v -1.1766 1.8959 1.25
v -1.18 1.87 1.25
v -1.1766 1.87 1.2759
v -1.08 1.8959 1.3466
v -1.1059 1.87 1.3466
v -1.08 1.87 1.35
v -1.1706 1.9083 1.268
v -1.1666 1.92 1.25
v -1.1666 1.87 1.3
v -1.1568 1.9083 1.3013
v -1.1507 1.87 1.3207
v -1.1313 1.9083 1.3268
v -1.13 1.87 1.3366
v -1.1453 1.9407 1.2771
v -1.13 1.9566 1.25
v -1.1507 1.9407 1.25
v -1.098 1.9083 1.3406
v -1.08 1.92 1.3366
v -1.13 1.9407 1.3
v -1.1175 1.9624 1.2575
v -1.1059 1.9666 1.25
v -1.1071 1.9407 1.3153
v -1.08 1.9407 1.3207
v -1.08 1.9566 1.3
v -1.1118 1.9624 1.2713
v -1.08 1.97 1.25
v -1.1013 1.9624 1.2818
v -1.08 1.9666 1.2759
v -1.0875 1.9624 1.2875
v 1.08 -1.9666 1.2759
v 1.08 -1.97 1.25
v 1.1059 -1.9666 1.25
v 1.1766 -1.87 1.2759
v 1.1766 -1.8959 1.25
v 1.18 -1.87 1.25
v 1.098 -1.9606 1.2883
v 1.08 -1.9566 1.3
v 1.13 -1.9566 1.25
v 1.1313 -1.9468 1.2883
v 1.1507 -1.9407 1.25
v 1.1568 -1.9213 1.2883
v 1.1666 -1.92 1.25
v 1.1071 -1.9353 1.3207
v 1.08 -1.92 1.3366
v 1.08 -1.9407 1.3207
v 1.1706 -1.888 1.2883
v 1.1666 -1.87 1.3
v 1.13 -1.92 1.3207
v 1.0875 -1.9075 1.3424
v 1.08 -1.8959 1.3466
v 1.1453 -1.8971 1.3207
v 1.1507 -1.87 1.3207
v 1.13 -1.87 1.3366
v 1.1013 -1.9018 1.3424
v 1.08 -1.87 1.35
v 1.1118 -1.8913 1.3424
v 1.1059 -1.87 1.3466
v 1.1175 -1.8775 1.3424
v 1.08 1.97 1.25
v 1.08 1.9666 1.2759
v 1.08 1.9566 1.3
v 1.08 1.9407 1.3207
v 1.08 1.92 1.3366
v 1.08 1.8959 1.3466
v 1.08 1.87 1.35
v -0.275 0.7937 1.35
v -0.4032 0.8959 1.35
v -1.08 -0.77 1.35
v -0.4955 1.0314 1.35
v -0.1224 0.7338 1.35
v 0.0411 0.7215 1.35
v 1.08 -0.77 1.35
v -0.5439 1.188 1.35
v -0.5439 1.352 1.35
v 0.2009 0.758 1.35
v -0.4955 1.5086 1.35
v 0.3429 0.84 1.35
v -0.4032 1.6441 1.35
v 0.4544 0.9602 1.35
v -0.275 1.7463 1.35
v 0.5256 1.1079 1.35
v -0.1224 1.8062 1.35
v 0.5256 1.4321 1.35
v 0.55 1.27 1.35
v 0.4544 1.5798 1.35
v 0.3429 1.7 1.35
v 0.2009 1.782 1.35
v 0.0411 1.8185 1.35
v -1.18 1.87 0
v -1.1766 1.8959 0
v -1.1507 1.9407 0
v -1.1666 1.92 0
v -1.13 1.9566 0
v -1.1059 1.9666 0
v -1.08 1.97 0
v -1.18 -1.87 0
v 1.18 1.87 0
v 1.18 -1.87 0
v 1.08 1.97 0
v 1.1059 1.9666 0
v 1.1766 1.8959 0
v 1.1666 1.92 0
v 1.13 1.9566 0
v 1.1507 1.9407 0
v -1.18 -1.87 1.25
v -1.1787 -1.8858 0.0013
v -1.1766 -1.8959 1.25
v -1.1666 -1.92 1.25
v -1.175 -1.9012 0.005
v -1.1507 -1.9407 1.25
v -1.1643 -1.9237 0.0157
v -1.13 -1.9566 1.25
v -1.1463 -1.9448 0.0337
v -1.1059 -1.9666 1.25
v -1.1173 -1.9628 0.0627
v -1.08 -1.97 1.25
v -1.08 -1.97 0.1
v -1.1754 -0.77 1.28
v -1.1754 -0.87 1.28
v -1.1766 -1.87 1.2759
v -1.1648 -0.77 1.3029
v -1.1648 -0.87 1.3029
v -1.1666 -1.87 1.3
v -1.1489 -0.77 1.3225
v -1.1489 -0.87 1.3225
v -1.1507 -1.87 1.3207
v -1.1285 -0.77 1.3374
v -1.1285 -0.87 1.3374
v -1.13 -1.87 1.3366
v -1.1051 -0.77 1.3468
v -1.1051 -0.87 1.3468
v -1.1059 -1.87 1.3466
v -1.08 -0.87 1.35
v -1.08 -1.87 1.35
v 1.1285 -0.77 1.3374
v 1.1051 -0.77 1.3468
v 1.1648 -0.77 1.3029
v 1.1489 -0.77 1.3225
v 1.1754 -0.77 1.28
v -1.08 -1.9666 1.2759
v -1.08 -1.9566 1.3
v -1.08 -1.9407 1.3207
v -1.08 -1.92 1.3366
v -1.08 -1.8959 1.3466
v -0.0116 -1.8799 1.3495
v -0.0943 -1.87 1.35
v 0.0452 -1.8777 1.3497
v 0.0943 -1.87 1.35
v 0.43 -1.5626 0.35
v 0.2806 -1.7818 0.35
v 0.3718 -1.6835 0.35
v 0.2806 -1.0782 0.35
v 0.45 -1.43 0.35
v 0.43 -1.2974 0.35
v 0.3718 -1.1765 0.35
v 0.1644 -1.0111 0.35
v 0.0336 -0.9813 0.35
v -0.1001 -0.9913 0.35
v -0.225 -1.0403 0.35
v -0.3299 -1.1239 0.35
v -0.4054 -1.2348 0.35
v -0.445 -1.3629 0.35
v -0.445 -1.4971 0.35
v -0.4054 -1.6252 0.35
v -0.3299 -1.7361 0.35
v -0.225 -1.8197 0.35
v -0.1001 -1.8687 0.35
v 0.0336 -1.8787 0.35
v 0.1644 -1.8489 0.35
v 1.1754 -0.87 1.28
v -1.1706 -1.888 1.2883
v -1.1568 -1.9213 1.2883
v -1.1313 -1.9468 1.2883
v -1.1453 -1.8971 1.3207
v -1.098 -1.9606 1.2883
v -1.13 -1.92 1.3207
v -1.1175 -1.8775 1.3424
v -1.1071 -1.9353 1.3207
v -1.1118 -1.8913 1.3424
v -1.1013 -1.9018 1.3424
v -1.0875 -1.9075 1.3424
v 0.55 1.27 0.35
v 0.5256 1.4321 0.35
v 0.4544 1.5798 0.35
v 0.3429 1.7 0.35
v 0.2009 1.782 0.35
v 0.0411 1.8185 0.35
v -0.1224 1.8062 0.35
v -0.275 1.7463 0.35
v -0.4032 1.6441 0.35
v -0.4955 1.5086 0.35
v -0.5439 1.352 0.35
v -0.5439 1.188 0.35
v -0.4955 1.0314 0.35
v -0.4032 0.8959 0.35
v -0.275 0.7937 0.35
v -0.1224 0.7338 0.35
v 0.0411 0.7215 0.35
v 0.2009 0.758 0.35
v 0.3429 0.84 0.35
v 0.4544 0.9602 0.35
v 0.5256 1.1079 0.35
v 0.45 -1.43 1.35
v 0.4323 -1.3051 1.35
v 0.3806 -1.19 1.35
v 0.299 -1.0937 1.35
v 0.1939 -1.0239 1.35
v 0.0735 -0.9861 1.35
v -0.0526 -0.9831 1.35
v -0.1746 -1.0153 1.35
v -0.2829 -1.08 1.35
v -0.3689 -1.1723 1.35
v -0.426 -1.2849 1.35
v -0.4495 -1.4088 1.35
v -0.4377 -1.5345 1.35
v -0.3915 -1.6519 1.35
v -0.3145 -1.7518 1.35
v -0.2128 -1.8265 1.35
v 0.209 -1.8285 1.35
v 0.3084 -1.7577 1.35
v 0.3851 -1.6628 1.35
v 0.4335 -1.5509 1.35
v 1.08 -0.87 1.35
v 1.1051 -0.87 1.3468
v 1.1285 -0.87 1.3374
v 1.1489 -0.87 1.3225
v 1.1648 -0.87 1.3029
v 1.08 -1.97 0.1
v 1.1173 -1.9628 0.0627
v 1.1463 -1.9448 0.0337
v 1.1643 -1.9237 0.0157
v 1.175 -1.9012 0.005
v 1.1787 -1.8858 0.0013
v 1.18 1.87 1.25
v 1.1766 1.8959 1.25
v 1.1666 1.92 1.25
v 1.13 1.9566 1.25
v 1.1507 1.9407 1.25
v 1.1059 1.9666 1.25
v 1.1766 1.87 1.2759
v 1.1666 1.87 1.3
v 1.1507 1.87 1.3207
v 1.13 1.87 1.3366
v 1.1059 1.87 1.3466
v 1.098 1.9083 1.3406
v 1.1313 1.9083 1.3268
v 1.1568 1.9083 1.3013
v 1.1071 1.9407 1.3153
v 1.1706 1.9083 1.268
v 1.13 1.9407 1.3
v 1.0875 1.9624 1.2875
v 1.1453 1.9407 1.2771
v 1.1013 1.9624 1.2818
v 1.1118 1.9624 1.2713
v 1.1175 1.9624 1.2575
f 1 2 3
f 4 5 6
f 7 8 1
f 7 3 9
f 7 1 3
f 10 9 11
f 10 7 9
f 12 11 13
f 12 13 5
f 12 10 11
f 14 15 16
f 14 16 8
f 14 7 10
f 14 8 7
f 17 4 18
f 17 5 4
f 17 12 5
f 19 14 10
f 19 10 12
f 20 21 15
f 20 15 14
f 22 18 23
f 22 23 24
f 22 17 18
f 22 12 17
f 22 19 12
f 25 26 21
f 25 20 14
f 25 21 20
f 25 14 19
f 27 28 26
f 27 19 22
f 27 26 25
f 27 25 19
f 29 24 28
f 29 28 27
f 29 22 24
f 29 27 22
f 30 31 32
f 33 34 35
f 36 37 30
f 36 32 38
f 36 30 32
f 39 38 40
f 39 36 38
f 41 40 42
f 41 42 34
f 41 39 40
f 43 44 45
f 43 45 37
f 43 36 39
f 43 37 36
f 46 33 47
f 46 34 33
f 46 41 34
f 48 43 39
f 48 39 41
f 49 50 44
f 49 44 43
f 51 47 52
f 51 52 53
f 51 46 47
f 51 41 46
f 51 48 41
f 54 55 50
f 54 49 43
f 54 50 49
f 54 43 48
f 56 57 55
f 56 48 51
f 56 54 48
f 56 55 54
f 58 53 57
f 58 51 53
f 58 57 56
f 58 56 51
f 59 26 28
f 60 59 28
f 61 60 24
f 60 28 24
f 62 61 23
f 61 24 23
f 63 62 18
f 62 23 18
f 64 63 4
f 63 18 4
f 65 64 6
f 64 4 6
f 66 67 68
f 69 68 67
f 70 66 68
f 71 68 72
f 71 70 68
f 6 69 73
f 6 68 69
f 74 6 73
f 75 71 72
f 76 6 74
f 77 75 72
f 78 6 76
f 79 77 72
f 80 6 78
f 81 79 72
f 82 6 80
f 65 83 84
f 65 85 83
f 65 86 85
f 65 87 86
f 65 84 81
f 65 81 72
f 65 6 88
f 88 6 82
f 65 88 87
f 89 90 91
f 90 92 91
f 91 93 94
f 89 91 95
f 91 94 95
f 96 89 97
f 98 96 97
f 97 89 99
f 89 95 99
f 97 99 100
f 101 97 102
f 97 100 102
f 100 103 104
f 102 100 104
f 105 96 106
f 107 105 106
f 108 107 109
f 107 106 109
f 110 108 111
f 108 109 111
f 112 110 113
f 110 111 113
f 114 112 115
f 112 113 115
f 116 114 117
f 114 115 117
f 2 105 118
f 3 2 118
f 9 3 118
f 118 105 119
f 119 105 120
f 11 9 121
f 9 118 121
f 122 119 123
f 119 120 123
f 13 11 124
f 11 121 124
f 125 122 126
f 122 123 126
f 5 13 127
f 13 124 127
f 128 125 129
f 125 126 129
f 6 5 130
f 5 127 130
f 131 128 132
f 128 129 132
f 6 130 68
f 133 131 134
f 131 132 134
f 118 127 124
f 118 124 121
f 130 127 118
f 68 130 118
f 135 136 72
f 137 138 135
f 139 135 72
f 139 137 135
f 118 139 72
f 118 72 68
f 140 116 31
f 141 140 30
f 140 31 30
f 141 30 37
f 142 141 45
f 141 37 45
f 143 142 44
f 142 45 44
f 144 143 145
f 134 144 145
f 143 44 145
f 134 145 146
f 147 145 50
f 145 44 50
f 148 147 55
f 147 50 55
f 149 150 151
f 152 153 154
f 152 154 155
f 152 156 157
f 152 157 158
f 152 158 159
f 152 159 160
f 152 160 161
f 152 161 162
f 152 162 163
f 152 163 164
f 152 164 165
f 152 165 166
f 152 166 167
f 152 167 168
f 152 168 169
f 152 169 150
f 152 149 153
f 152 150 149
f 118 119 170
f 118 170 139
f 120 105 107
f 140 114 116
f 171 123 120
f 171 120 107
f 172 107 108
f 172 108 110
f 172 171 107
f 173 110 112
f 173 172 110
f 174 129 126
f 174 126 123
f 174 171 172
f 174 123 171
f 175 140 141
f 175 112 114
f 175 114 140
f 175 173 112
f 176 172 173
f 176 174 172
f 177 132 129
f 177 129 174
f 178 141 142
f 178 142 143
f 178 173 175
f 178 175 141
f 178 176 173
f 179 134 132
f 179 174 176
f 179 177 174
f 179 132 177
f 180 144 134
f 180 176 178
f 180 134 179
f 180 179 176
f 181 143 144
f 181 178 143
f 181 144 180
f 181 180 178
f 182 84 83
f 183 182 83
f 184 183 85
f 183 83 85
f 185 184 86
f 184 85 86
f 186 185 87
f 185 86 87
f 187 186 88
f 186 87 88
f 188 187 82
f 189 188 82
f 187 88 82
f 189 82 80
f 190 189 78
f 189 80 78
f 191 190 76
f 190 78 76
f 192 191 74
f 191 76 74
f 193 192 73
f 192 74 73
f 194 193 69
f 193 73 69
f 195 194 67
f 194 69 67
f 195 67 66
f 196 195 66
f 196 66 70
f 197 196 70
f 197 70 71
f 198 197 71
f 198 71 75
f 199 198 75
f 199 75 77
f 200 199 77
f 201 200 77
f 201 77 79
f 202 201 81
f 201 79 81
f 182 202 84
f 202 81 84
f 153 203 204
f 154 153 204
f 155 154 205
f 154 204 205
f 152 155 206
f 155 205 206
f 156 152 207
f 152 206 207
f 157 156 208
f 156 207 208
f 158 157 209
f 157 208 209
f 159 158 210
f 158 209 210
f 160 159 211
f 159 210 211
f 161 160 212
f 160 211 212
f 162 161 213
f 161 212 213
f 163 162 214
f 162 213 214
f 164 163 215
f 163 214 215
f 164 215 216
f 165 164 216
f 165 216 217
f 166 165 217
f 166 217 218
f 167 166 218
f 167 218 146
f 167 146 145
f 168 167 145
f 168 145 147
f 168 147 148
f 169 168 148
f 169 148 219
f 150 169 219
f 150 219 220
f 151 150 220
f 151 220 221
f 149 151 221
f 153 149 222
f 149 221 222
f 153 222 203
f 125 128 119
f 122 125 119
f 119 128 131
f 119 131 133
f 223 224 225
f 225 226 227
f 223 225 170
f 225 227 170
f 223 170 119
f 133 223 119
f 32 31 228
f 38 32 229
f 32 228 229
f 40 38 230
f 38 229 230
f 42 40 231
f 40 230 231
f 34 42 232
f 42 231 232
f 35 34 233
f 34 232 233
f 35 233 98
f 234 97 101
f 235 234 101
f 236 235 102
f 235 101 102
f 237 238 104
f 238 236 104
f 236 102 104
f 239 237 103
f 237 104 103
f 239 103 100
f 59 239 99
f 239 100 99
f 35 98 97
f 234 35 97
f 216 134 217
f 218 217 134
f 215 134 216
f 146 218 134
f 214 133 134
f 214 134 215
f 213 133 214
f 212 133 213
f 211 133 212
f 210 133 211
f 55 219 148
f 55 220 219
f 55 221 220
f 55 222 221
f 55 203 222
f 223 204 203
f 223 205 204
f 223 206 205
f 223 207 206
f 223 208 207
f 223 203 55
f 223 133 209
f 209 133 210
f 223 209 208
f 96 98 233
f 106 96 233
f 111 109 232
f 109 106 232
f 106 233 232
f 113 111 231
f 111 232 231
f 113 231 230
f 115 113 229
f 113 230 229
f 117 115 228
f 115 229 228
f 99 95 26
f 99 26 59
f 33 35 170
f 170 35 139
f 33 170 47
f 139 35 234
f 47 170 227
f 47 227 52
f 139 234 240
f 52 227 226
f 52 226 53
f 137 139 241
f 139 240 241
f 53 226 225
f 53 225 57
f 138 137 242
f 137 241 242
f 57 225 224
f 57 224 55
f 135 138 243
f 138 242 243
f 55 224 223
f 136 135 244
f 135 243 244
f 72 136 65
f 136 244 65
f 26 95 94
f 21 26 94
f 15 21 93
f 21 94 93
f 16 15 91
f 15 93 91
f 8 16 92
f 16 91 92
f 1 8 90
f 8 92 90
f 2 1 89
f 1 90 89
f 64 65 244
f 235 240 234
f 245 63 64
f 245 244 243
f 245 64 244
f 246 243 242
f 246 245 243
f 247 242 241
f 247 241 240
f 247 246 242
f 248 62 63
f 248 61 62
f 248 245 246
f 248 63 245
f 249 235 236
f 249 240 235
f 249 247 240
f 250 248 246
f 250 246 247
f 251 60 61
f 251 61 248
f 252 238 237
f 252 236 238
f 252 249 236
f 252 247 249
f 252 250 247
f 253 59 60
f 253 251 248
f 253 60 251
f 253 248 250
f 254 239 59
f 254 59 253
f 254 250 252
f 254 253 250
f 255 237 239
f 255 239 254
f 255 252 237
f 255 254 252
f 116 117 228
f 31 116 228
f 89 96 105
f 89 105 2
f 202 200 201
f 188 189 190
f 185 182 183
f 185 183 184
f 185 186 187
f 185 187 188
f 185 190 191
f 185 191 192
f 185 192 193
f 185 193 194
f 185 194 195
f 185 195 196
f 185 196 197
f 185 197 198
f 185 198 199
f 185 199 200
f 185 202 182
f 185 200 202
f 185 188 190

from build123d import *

# Parameters (mm, degrees)
SKETCH1_W           = 2.36
SKETCH1_H           = 3.94
BOSS_EXTRUDE1_DEPTH = 1.35
SKETCH2_W           = 0.07
SKETCH2_H           = 0.1
CUT_EXTRUDE1_DEPTH  = 4.357528853
FILLET2_R           = 0.1
SKETCH3_R           = 0.55
SKETCH3_R_2         = 0.45
CUT_EXTRUDE2_DEPTH  = 1


with BuildPart() as part:
    # Sketch1 → Boss-Extrude1 (new body)
    with BuildSketch(Plane.XY):
        Rectangle(SKETCH1_W, SKETCH1_H)
    extrude(amount=BOSS_EXTRUDE1_DEPTH)

    # Sketch2 → Cut-Extrude1 (cut, through all)
    with BuildSketch(Plane(origin=(1.18, 0, 0), x_dir=(0, 0, -1), z_dir=(1, 0, 0))):
        with Locations((-1.315, -0.82)):
            Rectangle(SKETCH2_W, SKETCH2_H)
    extrude(amount=-CUT_EXTRUDE1_DEPTH, mode=Mode.SUBTRACT)

    # Fillet2
    # the kernel refuses this fillet: 0.1 mm, written as the material it takes off along each edge
    with BuildSketch(Plane(origin=(-1.08, 1.87, 1.25), x_dir=(-1, 0, 0), z_dir=(0, 1, 0))) as fillet2_piece_1_section:
        Polygon((0, 0), (FILLET2_R, 0), (FILLET2_R, FILLET2_R), (0, FILLET2_R), align=None)
    fillet2_piece_1 = extrude(amount=FILLET2_R, mode=Mode.PRIVATE)
    fillet2_piece_1 = fillet2_piece_1 - Plane(origin=(-1.08, 1.87, 1.25), x_dir=(0.7071067811865475, 0, -0.7071067811865475), z_dir=(0, 1, 0)) * Sphere(FILLET2_R, mode=Mode.PRIVATE)
    add(fillet2_piece_1, mode=Mode.SUBTRACT)
    with BuildSketch(Plane(origin=(1.08, 1.87, 1.25), x_dir=(1, 0, 0), z_dir=(0, 1, 0))) as fillet2_piece_2_section:
        Polygon((0, 0), (FILLET2_R, 0), (FILLET2_R, -FILLET2_R), (0, -FILLET2_R), align=None)
    fillet2_piece_2 = extrude(amount=FILLET2_R, mode=Mode.PRIVATE)
    fillet2_piece_2 = fillet2_piece_2 - Plane(origin=(1.08, 1.87, 1.25), x_dir=(-0.7071067811865475, 0, -0.7071067811865475), z_dir=(0, 1, 0)) * Sphere(FILLET2_R, mode=Mode.PRIVATE)
    add(fillet2_piece_2, mode=Mode.SUBTRACT)
    with BuildSketch(Plane(origin=(-1.08, -1.87, 1.25), x_dir=(-1, 0, 0), z_dir=(0, 0, 1))) as fillet2_piece_3_section:
        Polygon((0, 0), (FILLET2_R, 0), (FILLET2_R, FILLET2_R), (0, FILLET2_R), align=None)
    fillet2_piece_3 = extrude(amount=FILLET2_R, mode=Mode.PRIVATE)
    fillet2_piece_3 = fillet2_piece_3 - Plane(origin=(-1.08, -1.87, 1.25), x_dir=(0.7071067811865475, 0.7071067811865477, 0), z_dir=(0, 0, 1)) * Sphere(FILLET2_R, mode=Mode.PRIVATE)
    add(fillet2_piece_3, mode=Mode.SUBTRACT)
    with BuildSketch(Plane(origin=(1.08, -1.87, 1.25), x_dir=(0, -1, 0), z_dir=(0, 0, 1))) as fillet2_piece_4_section:
        Polygon((0, 0), (FILLET2_R, 0), (FILLET2_R, FILLET2_R), (0, FILLET2_R), align=None)
    fillet2_piece_4 = extrude(amount=FILLET2_R, mode=Mode.PRIVATE)
    fillet2_piece_4 = fillet2_piece_4 - Plane(origin=(1.08, -1.87, 1.25), x_dir=(-0.7071067811865476, 0.7071067811865475, 0), z_dir=(0, 0, 1)) * Sphere(FILLET2_R, mode=Mode.PRIVATE)
    add(fillet2_piece_4, mode=Mode.SUBTRACT)
    with BuildSketch(Plane(origin=(-1.18, -1.02, 1.35), x_dir=(0, 0, -1), z_dir=(0, 1, 0)), Plane(origin=(1.18, 1.87, 1.35), x_dir=(0, 0, -1), z_dir=(0, -1, 0))) as fillet2_piece_5:
        with BuildLine():
            CenterArc((FILLET2_R, -FILLET2_R), FILLET2_R, 90, 90)
            Line((0, -FILLET2_R), (0, 0))
            Line((0, 0), (FILLET2_R, 0))
        make_face()
    extrude(amount=2.89, mode=Mode.SUBTRACT)
    with BuildSketch(Plane(origin=(-1.18, -1.87, 1.35), x_dir=(0, 0, -1), z_dir=(0, 1, 0)), Plane(origin=(1.18, -0.62, 1.35), x_dir=(0, 0, -1), z_dir=(0, -1, 0))) as fillet2_piece_6:
        with BuildLine():
            CenterArc((FILLET2_R, -FILLET2_R), FILLET2_R, 90, 90)
            Line((0, -FILLET2_R), (0, 0))
            Line((0, 0), (FILLET2_R, 0))
        make_face()
    extrude(amount=1.25, mode=Mode.SUBTRACT)
    with BuildSketch(Plane(origin=(1.08, -1.97, 1.35), x_dir=(0, 1, 0), z_dir=(-1, 0, 0))) as fillet2_piece_7:
        with BuildLine():
            CenterArc((FILLET2_R, FILLET2_R), FILLET2_R, 180, 90)
            Line((0, FILLET2_R), (0, 0))
            Line((0, 0), (FILLET2_R, 0))
        make_face()
    extrude(amount=2.16, mode=Mode.SUBTRACT)
    with BuildSketch(Plane(origin=(1.43, -1.97, 0), x_dir=(0, 1, 0), z_dir=(-1, 0, 0))) as fillet2_piece_8:
        with BuildLine():
            CenterArc((FILLET2_R, -FILLET2_R), FILLET2_R, 90, 90)
            Line((0, -FILLET2_R), (0, 0))
            Line((0, 0), (FILLET2_R, 0))
        make_face()
    extrude(amount=2.86, mode=Mode.SUBTRACT)
    with BuildSketch(Plane(origin=(1.18, -1.97, -0.25), x_dir=(0, 1, 0), z_dir=(0, 0, 1)), Plane(origin=(1.18, 1.97, -0.25), x_dir=(-1, 0, 0), z_dir=(0, 0, 1))) as fillet2_piece_9:
        with BuildLine():
            CenterArc((FILLET2_R, FILLET2_R), FILLET2_R, 180, 90)
            Line((0, FILLET2_R), (0, 0))
            Line((0, 0), (FILLET2_R, 0))
        make_face()
    extrude(amount=1.5, mode=Mode.SUBTRACT)
    with BuildSketch(Plane(origin=(-1.18, -1.97, -0.25), x_dir=(0, 1, 0), z_dir=(0, 0, 1)), Plane(origin=(-1.18, 1.97, -0.25), x_dir=(1, 0, 0), z_dir=(0, 0, 1))) as fillet2_piece_10:
        with BuildLine():
            CenterArc((FILLET2_R, -FILLET2_R), FILLET2_R, 90, 90)
            Line((0, -FILLET2_R), (0, 0))
            Line((0, 0), (FILLET2_R, 0))
        make_face()
    extrude(amount=1.5, mode=Mode.SUBTRACT)
    with BuildSketch(Plane(origin=(-1.08, 1.97, 1.35), x_dir=(0, 0, -1), z_dir=(1, 0, 0))) as fillet2_piece_11:
        with BuildLine():
            CenterArc((FILLET2_R, -FILLET2_R), FILLET2_R, 90, 90)
            Line((0, -FILLET2_R), (0, 0))
            Line((0, 0), (FILLET2_R, 0))
        make_face()
    extrude(amount=2.16, mode=Mode.SUBTRACT)

    # Sketch3 → Cut-Extrude2 (cut)
    with BuildSketch(Plane.XY.offset(1.35)):
        with Locations((0, 1.27)):
            Circle(SKETCH3_R)
        with Locations((0, -1.43)):
            Circle(SKETCH3_R_2)
    extrude(amount=-CUT_EXTRUDE2_DEPTH, mode=Mode.SUBTRACT)


solid = part.part
